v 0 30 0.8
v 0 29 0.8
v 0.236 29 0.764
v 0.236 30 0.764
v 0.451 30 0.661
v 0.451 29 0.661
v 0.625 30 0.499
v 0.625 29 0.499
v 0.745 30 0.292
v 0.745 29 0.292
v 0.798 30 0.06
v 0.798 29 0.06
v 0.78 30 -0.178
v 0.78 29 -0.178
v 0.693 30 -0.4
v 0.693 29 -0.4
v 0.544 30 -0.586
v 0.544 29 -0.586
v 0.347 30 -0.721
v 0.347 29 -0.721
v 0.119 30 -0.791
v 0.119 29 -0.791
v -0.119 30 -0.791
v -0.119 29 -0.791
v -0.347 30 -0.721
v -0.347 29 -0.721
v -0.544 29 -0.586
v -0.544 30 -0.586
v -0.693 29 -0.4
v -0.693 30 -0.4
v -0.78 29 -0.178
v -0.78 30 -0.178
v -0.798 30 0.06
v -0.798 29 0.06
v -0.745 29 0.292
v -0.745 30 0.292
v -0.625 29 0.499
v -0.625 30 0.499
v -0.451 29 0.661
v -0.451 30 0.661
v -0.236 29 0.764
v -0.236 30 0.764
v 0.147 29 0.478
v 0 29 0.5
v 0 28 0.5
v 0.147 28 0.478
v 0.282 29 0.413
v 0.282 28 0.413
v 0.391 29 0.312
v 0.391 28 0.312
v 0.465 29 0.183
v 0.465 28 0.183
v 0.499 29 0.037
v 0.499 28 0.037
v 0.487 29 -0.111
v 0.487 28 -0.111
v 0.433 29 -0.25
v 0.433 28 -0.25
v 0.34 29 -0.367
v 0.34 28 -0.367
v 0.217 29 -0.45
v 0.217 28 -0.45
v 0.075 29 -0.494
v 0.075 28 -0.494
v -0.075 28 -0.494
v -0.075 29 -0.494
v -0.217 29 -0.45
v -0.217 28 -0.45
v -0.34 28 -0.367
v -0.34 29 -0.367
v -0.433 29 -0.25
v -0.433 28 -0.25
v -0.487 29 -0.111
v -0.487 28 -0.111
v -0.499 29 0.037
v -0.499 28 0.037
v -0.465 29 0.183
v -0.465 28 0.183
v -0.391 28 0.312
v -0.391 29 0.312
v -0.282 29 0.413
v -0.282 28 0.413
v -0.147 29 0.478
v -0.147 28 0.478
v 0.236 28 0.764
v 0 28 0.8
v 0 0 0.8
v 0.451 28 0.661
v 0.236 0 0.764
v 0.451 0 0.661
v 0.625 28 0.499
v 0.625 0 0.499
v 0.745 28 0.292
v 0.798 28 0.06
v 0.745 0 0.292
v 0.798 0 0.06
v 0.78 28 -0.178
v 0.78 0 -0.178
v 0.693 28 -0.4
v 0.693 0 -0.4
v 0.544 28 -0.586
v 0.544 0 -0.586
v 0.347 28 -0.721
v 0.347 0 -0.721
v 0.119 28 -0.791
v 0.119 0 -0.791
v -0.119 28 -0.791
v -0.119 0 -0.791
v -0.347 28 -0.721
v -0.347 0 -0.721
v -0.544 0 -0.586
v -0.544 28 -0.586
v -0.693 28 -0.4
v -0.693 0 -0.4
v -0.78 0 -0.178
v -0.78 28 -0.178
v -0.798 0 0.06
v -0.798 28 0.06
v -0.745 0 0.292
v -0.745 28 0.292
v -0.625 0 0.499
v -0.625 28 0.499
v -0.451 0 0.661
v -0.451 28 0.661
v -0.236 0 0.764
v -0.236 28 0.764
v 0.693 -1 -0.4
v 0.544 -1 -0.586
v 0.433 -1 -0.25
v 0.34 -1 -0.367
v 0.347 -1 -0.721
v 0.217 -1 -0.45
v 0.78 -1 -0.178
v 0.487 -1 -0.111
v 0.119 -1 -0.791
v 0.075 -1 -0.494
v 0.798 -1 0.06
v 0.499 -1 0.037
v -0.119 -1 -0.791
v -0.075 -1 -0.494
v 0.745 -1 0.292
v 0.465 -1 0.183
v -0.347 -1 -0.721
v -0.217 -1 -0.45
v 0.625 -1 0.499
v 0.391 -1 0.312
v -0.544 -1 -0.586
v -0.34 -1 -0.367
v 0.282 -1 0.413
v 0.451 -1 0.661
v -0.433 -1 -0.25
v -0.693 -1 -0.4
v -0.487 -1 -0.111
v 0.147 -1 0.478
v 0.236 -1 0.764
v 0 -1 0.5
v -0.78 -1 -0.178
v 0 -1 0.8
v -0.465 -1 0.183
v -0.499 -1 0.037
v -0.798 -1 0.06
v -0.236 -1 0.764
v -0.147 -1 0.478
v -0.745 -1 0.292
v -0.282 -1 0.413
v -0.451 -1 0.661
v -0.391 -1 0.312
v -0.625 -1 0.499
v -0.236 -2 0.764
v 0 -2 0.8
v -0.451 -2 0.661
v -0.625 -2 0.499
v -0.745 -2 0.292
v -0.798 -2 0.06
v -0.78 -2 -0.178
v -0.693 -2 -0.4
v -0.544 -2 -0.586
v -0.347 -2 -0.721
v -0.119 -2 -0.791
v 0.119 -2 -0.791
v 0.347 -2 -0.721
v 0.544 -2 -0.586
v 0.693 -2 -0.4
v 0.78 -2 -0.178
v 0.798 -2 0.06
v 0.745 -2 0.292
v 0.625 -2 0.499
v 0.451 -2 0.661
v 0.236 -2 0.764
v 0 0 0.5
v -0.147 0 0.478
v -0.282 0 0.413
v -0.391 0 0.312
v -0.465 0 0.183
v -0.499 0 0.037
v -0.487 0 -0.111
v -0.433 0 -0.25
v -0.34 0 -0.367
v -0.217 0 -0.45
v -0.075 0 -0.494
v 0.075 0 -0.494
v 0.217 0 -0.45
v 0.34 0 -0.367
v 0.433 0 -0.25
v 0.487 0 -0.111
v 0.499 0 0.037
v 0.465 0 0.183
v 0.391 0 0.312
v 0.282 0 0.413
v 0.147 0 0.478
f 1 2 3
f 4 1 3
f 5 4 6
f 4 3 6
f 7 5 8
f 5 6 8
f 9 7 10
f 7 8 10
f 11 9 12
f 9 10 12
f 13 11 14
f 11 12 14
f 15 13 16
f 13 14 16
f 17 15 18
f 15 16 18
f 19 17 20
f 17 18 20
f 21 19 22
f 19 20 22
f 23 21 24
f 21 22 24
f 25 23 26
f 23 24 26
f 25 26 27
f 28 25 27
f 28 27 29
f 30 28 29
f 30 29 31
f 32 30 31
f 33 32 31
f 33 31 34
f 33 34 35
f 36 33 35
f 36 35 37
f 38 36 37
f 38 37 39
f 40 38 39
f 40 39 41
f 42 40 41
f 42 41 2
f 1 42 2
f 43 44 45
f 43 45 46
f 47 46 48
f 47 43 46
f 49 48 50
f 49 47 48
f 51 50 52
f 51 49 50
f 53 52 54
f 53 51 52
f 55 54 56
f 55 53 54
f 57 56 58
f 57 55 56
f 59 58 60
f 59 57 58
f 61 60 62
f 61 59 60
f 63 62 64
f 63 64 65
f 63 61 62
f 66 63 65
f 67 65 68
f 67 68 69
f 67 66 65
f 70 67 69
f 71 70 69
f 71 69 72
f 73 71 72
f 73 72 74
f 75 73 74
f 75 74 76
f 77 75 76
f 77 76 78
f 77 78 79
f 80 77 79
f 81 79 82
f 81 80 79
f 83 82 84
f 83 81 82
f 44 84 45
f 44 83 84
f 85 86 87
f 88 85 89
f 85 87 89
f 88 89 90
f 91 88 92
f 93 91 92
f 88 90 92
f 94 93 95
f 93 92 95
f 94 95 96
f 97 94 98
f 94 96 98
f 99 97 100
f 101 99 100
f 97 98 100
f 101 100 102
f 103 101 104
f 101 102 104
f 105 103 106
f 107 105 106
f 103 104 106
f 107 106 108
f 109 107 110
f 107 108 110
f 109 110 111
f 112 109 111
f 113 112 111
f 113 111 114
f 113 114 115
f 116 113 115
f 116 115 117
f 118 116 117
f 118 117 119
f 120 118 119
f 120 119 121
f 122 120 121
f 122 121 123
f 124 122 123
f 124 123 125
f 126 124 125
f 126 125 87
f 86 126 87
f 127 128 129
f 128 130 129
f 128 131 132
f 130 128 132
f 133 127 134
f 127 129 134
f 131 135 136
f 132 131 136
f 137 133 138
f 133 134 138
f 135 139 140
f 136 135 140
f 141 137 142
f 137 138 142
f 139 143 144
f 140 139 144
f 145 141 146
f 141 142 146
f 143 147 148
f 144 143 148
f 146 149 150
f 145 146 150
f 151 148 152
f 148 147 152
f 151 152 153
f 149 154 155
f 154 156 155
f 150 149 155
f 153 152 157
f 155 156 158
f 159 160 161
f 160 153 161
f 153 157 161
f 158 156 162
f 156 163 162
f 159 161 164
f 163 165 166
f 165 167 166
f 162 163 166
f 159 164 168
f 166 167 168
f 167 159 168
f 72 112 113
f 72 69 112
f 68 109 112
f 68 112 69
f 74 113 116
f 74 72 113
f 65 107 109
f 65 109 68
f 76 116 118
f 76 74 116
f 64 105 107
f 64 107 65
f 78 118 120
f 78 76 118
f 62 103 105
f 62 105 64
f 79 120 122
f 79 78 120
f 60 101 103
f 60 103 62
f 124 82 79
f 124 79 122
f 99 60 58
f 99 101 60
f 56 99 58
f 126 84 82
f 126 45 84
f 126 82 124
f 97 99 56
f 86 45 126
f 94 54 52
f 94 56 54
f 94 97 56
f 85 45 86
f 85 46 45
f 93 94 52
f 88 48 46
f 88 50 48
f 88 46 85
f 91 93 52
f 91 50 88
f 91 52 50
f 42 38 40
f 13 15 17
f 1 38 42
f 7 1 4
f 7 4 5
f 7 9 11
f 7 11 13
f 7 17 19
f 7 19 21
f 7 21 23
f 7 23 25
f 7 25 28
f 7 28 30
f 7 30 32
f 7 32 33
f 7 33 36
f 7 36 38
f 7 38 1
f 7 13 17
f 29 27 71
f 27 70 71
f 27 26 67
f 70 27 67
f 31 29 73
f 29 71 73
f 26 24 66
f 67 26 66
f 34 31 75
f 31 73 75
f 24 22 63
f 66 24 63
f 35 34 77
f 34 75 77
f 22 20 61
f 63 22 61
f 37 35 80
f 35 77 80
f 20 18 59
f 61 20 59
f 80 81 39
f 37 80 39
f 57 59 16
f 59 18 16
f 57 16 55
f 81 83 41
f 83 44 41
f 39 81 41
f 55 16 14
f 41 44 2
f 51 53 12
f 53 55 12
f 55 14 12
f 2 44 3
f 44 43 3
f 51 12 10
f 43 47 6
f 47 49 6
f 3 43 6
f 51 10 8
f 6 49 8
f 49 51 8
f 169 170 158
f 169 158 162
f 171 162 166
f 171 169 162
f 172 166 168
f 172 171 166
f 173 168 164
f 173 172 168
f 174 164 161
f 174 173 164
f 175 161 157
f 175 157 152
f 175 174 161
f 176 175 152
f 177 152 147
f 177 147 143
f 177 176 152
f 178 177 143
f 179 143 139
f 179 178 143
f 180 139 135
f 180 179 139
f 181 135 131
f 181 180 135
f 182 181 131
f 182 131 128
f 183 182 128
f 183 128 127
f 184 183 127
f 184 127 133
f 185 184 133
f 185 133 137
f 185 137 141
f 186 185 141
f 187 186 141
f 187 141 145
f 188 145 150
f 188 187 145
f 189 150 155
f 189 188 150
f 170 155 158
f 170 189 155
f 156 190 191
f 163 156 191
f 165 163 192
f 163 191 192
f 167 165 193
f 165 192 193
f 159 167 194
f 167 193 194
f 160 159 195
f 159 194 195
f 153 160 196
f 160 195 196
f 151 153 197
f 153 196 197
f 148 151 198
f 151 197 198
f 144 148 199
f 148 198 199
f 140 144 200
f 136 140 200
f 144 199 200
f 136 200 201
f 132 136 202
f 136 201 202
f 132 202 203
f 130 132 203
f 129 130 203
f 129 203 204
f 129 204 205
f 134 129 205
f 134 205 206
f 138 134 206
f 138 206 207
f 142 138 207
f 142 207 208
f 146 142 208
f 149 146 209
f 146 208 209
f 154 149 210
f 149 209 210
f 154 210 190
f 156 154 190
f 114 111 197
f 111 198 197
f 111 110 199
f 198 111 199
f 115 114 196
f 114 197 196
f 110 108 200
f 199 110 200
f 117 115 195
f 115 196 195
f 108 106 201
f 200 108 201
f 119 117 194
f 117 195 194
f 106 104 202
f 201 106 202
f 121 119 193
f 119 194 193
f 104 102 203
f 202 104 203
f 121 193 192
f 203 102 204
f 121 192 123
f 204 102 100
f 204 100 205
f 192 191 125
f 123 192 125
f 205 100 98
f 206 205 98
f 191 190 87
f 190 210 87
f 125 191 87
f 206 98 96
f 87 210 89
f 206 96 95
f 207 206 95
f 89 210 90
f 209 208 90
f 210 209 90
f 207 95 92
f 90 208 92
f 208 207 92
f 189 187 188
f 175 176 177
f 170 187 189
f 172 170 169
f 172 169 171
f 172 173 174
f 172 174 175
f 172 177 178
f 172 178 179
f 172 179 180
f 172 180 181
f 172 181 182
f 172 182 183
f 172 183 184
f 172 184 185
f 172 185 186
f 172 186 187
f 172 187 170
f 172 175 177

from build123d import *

# Parameters (mm, degrees)
SKETCH1_R           = 0.8
BOSS_EXTRUDE1_DEPTH = 30
SKETCH3_R           = 0.5
BOSS_EXTRUDE2_DEPTH = 1
SKETCH4_R           = 0.8
SKETCH4_R_2         = 0.5
CUT_EXTRUDE1_DEPTH  = 1
BOSS_EXTRUDE3_START = 1
SKETCH5_R           = 0.8
BOSS_EXTRUDE3_DEPTH = 1


with BuildPart() as part:
    # Sketch1 → Boss-Extrude1 (new body)
    with BuildSketch(Plane(origin=(0, 0, 0), x_dir=(1, 0, 0), z_dir=(0, 1, 0))):
        with Locations(Location((0, 0, 0), (0, 0, 270))):
            Circle(SKETCH1_R)
    extrude(amount=BOSS_EXTRUDE1_DEPTH)

    # Sketch3 → Boss-Extrude2 (add)
    with BuildSketch(Plane.XZ):
        with Locations(Location((0, 0, 0), (0, 0, 90))):
            Circle(SKETCH3_R)
    extrude(amount=BOSS_EXTRUDE2_DEPTH)

    # Sketch4 → Cut-Extrude1 (cut)
    with BuildSketch(Plane(origin=(0, 29, 0), x_dir=(1, 0, 0), z_dir=(0, 1, 0))):
        with Locations(Location((0, 0, 0), (0, 0, 270))):
            Circle(SKETCH4_R)
        with Locations(Location((0, 0, 0), (0, 0, 270))):
            Circle(SKETCH4_R_2, mode=Mode.SUBTRACT)
    extrude(amount=-CUT_EXTRUDE1_DEPTH, mode=Mode.SUBTRACT)

    # Sketch5 → Boss-Extrude3 (add)
    with BuildSketch(Plane.XZ.offset(1).offset(BOSS_EXTRUDE3_START)):
        with Locations(Location((0, 0, 0), (0, 0, 90))):
            Circle(SKETCH5_R)
    extrude(amount=-BOSS_EXTRUDE3_DEPTH)


solid = part.part
